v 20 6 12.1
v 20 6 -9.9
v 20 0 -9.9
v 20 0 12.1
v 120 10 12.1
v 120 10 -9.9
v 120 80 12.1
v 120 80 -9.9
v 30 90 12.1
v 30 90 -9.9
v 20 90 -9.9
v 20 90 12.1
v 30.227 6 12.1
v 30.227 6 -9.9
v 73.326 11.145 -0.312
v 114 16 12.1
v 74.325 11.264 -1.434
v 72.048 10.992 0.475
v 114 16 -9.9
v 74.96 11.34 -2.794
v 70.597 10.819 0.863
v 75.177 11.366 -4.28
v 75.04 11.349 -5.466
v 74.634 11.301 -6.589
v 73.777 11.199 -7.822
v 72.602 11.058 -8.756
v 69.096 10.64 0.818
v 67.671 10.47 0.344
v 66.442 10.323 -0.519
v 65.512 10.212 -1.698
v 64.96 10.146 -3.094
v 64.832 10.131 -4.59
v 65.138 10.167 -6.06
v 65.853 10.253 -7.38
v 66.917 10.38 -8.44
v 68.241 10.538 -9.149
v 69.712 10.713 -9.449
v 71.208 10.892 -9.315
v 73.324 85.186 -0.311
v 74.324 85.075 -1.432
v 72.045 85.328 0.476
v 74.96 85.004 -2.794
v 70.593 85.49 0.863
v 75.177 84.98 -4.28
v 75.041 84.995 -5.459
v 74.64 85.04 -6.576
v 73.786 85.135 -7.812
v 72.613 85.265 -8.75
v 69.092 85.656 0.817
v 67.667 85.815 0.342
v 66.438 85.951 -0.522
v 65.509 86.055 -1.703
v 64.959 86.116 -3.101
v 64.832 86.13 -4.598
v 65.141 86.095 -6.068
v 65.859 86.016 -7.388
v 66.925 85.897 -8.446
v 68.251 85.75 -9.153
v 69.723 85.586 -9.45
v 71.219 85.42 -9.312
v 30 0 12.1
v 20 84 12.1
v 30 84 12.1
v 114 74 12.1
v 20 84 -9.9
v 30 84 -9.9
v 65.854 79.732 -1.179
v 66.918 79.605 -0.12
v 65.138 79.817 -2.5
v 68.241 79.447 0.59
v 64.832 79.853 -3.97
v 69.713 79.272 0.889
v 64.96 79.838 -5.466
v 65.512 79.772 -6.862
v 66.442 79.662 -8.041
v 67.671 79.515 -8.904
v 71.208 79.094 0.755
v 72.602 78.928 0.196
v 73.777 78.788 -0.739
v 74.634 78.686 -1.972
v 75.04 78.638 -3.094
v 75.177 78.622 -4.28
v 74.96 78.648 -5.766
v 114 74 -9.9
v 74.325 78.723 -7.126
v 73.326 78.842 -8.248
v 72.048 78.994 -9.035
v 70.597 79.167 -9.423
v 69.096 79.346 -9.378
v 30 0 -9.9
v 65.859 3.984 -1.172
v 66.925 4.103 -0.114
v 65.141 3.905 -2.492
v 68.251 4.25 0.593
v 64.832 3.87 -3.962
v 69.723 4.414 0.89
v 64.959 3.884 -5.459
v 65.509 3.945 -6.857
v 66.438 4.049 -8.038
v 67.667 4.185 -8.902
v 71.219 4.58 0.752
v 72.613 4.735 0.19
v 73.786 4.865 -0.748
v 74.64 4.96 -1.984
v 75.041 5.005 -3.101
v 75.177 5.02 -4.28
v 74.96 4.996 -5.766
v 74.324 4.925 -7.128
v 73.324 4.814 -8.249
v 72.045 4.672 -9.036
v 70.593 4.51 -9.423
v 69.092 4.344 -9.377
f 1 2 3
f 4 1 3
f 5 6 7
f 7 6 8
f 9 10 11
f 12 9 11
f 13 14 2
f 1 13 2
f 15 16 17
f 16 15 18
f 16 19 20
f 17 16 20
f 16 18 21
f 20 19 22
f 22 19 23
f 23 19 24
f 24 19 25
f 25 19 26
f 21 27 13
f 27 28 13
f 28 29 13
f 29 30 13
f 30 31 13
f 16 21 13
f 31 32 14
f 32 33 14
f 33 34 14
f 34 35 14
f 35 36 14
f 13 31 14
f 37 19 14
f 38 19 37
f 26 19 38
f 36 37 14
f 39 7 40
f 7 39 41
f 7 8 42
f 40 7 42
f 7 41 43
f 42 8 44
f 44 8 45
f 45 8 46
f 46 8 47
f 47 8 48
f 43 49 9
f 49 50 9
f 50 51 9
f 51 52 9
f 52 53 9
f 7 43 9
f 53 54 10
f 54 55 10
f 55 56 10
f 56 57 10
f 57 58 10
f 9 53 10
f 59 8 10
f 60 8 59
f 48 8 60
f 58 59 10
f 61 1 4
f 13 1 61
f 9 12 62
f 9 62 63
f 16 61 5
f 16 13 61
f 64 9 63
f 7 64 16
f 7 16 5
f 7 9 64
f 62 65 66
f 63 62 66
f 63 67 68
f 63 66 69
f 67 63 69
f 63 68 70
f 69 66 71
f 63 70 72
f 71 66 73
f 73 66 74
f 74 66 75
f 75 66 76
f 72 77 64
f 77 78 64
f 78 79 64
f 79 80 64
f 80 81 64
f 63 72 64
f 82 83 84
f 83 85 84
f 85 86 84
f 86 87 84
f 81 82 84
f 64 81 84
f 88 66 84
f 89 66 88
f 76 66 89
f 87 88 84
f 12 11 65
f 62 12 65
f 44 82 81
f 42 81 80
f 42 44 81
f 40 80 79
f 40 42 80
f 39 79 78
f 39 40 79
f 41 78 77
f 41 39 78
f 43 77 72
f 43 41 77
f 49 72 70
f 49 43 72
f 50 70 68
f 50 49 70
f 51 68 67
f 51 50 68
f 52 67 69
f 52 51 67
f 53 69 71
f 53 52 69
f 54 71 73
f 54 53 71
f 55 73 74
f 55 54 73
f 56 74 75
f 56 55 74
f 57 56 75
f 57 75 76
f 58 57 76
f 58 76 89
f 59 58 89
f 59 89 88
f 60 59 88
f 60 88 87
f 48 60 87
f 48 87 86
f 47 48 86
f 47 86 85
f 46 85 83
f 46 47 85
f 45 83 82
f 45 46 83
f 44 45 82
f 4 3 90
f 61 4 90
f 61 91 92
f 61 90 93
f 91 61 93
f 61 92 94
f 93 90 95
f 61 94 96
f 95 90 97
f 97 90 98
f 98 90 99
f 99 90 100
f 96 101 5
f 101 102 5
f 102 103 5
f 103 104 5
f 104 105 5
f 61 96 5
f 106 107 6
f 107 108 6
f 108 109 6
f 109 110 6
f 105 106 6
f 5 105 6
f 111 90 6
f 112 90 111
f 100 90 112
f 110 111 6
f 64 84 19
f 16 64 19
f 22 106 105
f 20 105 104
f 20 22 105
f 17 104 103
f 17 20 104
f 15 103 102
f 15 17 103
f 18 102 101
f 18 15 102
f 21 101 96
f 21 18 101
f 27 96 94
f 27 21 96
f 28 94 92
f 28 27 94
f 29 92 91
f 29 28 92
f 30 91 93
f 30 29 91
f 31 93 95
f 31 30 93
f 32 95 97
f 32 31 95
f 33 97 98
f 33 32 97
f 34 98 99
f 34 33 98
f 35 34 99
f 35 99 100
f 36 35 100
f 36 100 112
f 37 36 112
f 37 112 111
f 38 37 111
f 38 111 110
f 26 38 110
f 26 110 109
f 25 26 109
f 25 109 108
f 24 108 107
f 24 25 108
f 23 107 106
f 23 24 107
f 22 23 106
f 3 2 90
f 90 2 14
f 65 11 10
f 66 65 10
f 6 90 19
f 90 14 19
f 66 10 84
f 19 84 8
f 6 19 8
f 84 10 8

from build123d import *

# Parameters (mm, degrees)
SKETCH042_R      = 5.177463
EXTRUDE045_DEPTH = 800
EXTRUDE044_DEPTH = 22


with BuildPart() as extrude045:
    # Sketch042 → Extrude045 (new body)
    with BuildSketch(Plane.XZ):
        with Locations((70, 3.62)):
            Circle(SKETCH042_R)
    extrude(amount=EXTRUDE045_DEPTH)


with BuildPart() as extrude045_1:
    # Extrude045 placement: moved
    add(extrude045.part.moved(Location((0, 293, 0))))


with BuildPart() as tapa_delantera_baja:
    # Sketch041 → Extrude044 (new body)
    with BuildSketch(Plane.XY):
        Polygon((30, 0), (120, 10), (120, 80), (30, 90), (20, 90), (20, 84), (30, 84), (114, 74), (114, 16), (30.22679, 6), (20, 6), (20, 0), align=None)
    extrude(amount=EXTRUDE044_DEPTH)


with BuildPart() as tapa_delantera_baja_1:
    # Extrude044 placement: moved
    add(tapa_delantera_baja.part.moved(Location((0, 0, -2))))

    # Cut014: cut Extrude045
    add(extrude045_1.part, mode=Mode.SUBTRACT)


with BuildPart() as tapa_delantera_baja_2:
    # Cut014 placement: moved
    add(tapa_delantera_baja_1.part.moved(Location((0, 0, -7.9))))


solid = tapa_delantera_baja_2.part
